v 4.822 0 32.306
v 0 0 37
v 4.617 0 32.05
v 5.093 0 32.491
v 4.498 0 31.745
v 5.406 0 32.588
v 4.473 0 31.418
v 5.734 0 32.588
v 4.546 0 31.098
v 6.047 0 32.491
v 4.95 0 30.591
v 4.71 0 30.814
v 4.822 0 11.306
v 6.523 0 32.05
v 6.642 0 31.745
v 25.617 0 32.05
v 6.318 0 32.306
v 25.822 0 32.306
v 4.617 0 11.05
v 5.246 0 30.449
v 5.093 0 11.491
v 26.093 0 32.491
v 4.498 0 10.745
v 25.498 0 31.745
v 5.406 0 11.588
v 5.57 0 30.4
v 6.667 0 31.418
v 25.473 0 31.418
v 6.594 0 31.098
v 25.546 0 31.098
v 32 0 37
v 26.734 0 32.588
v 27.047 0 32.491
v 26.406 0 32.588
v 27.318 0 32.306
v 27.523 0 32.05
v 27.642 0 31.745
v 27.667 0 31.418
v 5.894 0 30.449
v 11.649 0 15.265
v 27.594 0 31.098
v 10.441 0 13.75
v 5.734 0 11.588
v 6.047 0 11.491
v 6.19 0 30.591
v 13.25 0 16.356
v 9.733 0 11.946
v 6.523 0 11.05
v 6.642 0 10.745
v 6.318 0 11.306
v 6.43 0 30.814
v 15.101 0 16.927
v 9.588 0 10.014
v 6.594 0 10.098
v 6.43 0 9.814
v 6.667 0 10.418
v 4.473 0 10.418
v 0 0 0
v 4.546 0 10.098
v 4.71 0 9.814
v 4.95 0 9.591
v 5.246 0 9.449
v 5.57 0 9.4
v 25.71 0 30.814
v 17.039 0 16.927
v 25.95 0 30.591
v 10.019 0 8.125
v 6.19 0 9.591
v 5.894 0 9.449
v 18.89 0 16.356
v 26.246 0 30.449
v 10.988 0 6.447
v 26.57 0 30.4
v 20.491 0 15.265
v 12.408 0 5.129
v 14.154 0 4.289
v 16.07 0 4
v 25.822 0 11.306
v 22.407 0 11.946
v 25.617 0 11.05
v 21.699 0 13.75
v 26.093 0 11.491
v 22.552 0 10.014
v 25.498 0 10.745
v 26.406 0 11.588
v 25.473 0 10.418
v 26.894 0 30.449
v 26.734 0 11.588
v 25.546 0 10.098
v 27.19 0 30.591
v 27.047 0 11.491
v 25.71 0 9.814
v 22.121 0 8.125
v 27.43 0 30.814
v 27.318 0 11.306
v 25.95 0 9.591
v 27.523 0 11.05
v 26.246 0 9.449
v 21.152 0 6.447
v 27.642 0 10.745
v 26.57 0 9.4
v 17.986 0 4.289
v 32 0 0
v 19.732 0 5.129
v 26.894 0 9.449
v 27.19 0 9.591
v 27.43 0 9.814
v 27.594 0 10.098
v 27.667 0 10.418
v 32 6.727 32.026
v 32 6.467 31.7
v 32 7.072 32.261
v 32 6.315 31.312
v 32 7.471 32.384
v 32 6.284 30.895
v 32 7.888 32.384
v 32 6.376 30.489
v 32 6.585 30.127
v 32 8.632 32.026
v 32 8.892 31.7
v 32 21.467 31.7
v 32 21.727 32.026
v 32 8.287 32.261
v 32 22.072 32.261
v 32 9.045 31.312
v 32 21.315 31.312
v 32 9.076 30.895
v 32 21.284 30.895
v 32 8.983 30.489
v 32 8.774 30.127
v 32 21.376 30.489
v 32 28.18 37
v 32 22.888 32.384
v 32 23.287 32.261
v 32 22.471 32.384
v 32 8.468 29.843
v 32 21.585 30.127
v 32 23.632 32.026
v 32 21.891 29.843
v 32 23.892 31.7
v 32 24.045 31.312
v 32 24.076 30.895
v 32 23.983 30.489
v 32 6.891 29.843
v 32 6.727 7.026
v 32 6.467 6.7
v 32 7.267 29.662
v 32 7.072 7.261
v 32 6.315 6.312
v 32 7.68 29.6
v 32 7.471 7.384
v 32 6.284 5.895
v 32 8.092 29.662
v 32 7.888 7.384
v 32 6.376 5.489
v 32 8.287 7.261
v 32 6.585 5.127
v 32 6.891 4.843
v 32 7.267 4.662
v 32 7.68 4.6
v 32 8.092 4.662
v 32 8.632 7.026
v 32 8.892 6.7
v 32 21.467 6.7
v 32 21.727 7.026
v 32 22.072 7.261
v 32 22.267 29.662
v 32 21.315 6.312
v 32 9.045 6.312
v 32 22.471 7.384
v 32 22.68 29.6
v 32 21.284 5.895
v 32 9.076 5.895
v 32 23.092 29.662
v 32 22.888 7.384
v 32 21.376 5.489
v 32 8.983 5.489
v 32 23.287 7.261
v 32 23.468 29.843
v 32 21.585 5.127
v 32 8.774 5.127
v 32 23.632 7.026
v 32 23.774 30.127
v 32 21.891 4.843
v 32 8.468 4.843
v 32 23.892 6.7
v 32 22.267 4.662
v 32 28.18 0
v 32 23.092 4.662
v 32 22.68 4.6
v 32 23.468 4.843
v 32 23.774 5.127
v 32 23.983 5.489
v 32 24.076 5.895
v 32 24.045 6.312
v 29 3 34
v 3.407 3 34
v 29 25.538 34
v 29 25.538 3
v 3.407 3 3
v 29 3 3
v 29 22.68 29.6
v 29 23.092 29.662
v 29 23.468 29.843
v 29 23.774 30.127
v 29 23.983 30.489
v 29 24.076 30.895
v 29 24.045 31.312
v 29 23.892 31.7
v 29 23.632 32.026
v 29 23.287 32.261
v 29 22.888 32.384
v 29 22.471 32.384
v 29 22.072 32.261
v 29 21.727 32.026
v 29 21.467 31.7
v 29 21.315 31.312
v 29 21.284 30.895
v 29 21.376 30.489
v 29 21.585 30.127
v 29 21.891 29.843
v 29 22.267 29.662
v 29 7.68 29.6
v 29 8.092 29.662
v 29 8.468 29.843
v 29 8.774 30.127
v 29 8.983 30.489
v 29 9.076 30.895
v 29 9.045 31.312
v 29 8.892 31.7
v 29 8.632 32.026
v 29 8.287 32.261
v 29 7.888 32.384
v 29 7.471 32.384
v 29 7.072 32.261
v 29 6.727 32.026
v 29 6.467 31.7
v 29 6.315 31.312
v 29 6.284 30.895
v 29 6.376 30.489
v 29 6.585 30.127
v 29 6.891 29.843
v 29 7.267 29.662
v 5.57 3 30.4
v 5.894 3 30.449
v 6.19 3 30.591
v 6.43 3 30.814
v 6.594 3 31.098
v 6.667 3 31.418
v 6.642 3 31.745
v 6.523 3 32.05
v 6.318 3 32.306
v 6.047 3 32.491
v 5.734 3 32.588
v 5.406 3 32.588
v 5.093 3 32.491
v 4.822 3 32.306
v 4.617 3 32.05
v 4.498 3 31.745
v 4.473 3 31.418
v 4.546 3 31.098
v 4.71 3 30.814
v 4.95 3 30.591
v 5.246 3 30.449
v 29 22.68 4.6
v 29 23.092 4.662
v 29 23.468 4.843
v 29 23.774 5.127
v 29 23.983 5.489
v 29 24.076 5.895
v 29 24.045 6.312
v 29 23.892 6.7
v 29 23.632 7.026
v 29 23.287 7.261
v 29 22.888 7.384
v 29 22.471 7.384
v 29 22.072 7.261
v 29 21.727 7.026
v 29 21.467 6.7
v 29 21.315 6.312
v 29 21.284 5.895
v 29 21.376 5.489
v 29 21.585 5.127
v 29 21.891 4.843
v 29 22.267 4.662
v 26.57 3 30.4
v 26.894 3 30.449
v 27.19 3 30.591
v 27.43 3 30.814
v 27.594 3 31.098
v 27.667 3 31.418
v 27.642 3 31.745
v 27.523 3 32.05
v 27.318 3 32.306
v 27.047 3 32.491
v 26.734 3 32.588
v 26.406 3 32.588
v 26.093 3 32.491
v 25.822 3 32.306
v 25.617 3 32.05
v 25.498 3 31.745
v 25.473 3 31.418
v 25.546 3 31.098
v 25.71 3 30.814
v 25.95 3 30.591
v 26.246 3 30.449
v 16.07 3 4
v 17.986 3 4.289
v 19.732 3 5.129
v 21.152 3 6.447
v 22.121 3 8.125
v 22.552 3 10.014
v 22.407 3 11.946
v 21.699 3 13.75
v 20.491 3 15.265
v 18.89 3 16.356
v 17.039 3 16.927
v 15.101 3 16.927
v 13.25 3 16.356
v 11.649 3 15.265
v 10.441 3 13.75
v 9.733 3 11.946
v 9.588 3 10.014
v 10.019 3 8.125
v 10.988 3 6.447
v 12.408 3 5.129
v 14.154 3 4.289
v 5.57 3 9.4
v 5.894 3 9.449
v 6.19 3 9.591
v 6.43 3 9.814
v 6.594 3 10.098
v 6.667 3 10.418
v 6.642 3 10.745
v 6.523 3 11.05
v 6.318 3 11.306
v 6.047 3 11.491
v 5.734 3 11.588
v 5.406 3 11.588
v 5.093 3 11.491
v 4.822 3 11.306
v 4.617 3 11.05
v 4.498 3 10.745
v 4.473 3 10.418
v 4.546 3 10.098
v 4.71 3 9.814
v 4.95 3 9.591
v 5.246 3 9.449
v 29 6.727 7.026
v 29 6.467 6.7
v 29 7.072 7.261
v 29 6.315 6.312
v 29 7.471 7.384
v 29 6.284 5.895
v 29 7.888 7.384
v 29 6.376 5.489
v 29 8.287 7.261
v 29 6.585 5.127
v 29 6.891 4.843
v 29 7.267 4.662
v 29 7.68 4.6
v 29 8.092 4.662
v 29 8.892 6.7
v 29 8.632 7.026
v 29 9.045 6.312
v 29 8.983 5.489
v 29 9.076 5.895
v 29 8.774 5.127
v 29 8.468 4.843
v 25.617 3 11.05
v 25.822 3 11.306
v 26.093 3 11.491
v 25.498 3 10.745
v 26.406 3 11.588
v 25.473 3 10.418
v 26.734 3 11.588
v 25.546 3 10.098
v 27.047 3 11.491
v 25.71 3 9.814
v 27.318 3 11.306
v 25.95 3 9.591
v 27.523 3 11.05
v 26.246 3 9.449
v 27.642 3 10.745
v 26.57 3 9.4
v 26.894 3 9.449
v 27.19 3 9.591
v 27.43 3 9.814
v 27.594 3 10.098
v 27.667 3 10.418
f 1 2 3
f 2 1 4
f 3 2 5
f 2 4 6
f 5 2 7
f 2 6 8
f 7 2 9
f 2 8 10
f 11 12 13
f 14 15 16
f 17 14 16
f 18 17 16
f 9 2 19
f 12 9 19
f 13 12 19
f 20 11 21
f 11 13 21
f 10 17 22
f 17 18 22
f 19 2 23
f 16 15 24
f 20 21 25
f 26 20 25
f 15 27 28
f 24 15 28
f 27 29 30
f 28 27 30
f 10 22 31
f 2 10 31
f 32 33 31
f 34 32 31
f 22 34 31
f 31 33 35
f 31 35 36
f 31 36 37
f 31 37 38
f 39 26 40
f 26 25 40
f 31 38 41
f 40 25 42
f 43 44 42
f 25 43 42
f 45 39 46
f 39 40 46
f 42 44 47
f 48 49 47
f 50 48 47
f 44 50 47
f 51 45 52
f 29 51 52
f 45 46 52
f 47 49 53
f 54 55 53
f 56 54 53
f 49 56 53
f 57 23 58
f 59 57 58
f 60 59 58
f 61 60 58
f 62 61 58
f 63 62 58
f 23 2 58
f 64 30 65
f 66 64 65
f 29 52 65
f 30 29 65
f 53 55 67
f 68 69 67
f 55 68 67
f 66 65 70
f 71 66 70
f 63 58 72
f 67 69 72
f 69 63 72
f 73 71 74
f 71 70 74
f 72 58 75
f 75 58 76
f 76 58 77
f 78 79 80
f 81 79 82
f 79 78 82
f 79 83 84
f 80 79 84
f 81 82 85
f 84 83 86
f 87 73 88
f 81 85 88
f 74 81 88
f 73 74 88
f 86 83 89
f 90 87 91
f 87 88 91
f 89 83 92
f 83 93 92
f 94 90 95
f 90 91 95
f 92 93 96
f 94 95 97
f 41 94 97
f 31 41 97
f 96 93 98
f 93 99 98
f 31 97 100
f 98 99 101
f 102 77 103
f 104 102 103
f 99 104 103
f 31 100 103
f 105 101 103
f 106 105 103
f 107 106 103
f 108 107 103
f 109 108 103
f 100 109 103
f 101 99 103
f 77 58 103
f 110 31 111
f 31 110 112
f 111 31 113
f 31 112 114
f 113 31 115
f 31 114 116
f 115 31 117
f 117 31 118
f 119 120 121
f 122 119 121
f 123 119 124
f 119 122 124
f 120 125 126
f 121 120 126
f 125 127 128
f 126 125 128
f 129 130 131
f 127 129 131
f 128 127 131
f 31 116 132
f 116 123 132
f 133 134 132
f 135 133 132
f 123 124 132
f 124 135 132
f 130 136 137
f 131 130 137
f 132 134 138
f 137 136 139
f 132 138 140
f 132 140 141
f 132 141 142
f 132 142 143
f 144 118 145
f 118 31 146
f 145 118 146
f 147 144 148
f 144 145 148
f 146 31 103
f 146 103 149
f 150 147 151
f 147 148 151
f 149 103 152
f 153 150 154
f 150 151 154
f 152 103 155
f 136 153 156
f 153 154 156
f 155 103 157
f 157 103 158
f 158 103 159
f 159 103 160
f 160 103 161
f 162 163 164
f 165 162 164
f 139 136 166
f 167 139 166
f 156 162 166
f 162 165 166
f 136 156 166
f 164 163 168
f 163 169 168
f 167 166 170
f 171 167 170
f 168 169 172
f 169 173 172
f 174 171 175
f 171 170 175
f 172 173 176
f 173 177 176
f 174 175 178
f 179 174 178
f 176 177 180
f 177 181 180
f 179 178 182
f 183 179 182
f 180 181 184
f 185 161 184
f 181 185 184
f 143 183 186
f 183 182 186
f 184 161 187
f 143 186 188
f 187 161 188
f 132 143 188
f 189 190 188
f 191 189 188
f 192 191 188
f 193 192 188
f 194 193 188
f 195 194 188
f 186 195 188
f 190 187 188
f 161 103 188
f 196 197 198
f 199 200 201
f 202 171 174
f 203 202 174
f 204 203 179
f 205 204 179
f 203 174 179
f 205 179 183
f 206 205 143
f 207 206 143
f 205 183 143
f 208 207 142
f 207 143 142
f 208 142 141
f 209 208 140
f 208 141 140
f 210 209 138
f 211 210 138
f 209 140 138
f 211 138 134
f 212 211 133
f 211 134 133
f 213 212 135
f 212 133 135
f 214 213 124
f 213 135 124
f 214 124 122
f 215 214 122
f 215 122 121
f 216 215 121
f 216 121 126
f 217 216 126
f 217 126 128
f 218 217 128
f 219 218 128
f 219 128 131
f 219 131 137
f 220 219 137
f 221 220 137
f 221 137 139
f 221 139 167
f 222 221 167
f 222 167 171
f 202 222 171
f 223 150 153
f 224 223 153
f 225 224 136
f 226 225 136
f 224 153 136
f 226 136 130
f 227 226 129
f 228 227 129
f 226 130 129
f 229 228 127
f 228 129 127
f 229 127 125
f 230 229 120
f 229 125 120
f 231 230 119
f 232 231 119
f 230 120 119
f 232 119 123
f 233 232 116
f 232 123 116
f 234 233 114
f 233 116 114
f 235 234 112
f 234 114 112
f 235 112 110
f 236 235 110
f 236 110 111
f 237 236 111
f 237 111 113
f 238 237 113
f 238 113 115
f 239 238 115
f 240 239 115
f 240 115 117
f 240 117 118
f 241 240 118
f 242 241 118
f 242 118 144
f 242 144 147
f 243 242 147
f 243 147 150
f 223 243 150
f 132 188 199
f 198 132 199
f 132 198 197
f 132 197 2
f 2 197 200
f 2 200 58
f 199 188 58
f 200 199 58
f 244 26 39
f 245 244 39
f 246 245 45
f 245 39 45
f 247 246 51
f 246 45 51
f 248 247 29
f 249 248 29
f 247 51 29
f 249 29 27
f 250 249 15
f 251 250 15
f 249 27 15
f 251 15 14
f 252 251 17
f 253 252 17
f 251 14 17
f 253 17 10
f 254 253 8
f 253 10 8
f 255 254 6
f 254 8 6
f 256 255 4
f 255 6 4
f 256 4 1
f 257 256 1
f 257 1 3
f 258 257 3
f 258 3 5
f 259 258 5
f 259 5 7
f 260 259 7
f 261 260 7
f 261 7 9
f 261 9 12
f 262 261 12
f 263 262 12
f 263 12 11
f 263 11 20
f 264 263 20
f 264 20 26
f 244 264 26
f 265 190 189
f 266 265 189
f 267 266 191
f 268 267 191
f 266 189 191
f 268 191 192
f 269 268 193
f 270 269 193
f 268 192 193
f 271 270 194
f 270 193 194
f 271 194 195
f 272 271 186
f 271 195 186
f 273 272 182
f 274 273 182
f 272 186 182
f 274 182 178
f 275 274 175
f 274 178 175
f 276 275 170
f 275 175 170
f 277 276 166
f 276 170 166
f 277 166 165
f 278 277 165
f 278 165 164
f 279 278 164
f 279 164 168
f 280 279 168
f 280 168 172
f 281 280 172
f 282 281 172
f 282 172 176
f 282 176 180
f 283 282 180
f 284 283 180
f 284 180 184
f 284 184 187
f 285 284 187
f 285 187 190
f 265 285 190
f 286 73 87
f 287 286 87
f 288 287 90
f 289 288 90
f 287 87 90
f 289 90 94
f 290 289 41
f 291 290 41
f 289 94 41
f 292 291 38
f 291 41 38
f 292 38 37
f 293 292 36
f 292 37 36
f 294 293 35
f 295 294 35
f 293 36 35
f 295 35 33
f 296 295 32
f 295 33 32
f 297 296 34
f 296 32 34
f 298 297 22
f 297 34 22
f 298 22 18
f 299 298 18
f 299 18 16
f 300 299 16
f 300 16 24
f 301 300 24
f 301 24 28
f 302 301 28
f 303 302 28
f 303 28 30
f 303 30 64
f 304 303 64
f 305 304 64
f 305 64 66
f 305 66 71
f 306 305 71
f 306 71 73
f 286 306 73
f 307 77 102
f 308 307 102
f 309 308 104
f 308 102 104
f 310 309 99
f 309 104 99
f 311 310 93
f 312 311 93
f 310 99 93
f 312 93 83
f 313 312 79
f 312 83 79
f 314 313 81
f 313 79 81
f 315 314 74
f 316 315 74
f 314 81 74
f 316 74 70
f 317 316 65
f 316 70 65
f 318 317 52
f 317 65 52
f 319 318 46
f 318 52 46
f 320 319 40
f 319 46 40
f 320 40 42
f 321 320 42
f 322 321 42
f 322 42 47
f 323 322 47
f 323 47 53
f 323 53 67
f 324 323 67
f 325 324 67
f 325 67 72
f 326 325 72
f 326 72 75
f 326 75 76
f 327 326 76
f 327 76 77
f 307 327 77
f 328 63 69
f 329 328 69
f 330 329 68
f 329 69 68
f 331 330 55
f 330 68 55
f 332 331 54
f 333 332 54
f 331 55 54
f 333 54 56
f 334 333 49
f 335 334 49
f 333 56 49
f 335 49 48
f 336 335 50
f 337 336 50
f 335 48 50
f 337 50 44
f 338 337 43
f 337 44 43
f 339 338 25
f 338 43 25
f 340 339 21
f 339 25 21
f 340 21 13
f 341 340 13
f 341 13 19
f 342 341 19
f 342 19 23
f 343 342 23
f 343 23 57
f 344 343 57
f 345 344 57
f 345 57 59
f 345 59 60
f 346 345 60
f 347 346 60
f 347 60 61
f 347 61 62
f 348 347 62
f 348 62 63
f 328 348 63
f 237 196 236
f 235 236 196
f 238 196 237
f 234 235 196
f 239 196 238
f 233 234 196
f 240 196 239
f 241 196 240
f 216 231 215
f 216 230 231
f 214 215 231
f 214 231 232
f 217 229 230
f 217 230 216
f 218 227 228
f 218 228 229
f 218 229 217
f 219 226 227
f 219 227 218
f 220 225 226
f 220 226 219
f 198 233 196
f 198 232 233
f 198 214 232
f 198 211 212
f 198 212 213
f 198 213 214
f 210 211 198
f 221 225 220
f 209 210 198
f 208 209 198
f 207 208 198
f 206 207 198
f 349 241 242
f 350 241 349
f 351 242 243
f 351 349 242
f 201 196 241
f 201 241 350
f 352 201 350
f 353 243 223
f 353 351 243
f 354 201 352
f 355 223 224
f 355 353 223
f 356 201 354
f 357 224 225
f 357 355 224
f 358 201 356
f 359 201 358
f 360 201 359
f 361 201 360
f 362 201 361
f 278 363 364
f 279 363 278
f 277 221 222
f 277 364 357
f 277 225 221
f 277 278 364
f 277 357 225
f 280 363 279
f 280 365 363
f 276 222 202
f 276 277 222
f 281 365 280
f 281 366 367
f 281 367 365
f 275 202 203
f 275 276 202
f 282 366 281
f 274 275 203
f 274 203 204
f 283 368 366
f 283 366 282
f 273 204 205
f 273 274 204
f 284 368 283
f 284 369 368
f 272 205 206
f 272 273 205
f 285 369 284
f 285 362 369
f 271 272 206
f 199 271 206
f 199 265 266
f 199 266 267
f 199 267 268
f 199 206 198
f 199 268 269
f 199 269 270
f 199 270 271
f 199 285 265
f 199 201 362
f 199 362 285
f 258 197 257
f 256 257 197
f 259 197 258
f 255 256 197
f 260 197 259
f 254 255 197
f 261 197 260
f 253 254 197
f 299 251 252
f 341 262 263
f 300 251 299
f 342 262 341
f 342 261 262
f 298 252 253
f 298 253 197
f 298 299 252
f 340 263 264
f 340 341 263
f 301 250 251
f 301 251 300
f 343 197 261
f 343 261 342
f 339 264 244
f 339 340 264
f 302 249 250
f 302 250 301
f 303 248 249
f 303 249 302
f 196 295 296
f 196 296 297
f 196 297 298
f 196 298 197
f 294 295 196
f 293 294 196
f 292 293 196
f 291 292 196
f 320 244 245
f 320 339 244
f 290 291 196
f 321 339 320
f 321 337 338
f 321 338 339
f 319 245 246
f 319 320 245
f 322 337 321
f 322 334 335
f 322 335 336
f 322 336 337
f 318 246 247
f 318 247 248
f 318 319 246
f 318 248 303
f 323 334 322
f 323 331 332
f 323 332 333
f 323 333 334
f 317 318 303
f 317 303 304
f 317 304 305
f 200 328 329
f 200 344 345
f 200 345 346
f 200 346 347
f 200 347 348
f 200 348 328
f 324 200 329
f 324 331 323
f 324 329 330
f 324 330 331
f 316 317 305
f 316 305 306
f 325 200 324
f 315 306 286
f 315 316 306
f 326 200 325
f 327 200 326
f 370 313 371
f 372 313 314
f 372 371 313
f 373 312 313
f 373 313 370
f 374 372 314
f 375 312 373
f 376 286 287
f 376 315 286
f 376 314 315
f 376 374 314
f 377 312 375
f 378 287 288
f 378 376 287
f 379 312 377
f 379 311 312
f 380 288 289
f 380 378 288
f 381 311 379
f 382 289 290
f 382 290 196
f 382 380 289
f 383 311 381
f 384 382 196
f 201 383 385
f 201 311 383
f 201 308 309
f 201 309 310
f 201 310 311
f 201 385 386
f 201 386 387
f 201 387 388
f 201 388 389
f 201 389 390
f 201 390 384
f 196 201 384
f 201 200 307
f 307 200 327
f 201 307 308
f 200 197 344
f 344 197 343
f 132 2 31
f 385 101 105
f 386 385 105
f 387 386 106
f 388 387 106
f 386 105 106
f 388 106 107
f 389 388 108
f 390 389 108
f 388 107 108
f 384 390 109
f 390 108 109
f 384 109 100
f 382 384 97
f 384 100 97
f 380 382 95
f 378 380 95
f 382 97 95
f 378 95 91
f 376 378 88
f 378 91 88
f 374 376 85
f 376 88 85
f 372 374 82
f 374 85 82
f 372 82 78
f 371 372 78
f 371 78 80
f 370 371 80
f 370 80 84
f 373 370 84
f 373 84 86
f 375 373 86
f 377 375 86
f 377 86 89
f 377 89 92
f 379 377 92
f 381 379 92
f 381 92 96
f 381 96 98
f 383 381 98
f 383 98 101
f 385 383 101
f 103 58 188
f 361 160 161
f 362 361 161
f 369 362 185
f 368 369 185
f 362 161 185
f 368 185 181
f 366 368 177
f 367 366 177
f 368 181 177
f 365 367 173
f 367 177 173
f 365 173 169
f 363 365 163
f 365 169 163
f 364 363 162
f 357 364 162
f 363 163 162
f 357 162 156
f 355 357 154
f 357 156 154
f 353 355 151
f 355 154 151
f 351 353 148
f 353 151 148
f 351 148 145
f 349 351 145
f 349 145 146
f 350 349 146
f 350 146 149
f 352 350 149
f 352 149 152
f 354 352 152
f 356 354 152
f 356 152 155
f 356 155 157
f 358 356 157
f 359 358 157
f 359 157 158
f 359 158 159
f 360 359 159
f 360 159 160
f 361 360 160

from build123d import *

# Parameters (mm, degrees)
EXTRUDE_1_DEPTH     = 37
SHELL_1_T           = -3
SKETCH_2_R          = 1.1
CUT_EXTRUDE_1_DEPTH = 30
SKETCH_3_R          = 6.5
CUT_EXTRUDE_2_DEPTH = 5
SKETCH_4_R          = 1.4
CUT_EXTRUDE_3_DEPTH = 5


with BuildPart() as part:
    # ｽｹｯﾁ1 → ﾎﾞｽ - 押し出し1 (new body)
    with BuildSketch(Plane.XY):
        Polygon((0, 0), (32, 0), (32, 28.179721765), align=None)
    extrude(amount=EXTRUDE_1_DEPTH)

    # ｼｪﾙ1
    shell_1_openings = [part.faces().sort_by_distance(p)[0] for p in [
        (16, 14.089860882, 18.5),
    ]]
    offset(amount=SHELL_1_T, openings=shell_1_openings, kind=Kind.INTERSECTION)

    # ｽｹｯﾁ2 → ｶｯﾄ - 押し出し1 (cut)
    with BuildSketch(Plane.XZ):
        with Locations(Location((26.57, 10.5, 0), (0, 0, 270))):
            Circle(SKETCH_2_R)
        with Locations(Location((5.57, 10.5, 0), (0, 0, 270))):
            Circle(SKETCH_2_R)
        with Locations(Location((5.57, 31.5, 0), (0, 0, 270))):
            Circle(SKETCH_2_R)
        with Locations(Location((26.57, 31.5, 0), (0, 0, 270))):
            Circle(SKETCH_2_R)
    extrude(amount=-CUT_EXTRUDE_1_DEPTH, mode=Mode.SUBTRACT)

    # ｽｹｯﾁ3 → ｶｯﾄ - 押し出し2 (cut)
    with BuildSketch(Plane.XZ):
        with Locations(Location((16.07, 10.5, 0), (0, 0, 270))):
            Circle(SKETCH_3_R)
    extrude(amount=-CUT_EXTRUDE_2_DEPTH, mode=Mode.SUBTRACT)

    # ｽｹｯﾁ4 → ｶｯﾄ - 押し出し3 (cut)
    with BuildSketch(Plane(origin=(32, 0, 0), x_dir=(0, 0, -1), z_dir=(1, 0, 0))):
        with Locations((-6, 22.679721765)):
            Circle(SKETCH_4_R)
        with Locations((-31, 22.679721765)):
            Circle(SKETCH_4_R)
        with Locations((-31, 7.679721765)):
            Circle(SKETCH_4_R)
        with Locations((-6, 7.679721765)):
            Circle(SKETCH_4_R)
    extrude(amount=-CUT_EXTRUDE_3_DEPTH, mode=Mode.SUBTRACT)


solid = part.part
